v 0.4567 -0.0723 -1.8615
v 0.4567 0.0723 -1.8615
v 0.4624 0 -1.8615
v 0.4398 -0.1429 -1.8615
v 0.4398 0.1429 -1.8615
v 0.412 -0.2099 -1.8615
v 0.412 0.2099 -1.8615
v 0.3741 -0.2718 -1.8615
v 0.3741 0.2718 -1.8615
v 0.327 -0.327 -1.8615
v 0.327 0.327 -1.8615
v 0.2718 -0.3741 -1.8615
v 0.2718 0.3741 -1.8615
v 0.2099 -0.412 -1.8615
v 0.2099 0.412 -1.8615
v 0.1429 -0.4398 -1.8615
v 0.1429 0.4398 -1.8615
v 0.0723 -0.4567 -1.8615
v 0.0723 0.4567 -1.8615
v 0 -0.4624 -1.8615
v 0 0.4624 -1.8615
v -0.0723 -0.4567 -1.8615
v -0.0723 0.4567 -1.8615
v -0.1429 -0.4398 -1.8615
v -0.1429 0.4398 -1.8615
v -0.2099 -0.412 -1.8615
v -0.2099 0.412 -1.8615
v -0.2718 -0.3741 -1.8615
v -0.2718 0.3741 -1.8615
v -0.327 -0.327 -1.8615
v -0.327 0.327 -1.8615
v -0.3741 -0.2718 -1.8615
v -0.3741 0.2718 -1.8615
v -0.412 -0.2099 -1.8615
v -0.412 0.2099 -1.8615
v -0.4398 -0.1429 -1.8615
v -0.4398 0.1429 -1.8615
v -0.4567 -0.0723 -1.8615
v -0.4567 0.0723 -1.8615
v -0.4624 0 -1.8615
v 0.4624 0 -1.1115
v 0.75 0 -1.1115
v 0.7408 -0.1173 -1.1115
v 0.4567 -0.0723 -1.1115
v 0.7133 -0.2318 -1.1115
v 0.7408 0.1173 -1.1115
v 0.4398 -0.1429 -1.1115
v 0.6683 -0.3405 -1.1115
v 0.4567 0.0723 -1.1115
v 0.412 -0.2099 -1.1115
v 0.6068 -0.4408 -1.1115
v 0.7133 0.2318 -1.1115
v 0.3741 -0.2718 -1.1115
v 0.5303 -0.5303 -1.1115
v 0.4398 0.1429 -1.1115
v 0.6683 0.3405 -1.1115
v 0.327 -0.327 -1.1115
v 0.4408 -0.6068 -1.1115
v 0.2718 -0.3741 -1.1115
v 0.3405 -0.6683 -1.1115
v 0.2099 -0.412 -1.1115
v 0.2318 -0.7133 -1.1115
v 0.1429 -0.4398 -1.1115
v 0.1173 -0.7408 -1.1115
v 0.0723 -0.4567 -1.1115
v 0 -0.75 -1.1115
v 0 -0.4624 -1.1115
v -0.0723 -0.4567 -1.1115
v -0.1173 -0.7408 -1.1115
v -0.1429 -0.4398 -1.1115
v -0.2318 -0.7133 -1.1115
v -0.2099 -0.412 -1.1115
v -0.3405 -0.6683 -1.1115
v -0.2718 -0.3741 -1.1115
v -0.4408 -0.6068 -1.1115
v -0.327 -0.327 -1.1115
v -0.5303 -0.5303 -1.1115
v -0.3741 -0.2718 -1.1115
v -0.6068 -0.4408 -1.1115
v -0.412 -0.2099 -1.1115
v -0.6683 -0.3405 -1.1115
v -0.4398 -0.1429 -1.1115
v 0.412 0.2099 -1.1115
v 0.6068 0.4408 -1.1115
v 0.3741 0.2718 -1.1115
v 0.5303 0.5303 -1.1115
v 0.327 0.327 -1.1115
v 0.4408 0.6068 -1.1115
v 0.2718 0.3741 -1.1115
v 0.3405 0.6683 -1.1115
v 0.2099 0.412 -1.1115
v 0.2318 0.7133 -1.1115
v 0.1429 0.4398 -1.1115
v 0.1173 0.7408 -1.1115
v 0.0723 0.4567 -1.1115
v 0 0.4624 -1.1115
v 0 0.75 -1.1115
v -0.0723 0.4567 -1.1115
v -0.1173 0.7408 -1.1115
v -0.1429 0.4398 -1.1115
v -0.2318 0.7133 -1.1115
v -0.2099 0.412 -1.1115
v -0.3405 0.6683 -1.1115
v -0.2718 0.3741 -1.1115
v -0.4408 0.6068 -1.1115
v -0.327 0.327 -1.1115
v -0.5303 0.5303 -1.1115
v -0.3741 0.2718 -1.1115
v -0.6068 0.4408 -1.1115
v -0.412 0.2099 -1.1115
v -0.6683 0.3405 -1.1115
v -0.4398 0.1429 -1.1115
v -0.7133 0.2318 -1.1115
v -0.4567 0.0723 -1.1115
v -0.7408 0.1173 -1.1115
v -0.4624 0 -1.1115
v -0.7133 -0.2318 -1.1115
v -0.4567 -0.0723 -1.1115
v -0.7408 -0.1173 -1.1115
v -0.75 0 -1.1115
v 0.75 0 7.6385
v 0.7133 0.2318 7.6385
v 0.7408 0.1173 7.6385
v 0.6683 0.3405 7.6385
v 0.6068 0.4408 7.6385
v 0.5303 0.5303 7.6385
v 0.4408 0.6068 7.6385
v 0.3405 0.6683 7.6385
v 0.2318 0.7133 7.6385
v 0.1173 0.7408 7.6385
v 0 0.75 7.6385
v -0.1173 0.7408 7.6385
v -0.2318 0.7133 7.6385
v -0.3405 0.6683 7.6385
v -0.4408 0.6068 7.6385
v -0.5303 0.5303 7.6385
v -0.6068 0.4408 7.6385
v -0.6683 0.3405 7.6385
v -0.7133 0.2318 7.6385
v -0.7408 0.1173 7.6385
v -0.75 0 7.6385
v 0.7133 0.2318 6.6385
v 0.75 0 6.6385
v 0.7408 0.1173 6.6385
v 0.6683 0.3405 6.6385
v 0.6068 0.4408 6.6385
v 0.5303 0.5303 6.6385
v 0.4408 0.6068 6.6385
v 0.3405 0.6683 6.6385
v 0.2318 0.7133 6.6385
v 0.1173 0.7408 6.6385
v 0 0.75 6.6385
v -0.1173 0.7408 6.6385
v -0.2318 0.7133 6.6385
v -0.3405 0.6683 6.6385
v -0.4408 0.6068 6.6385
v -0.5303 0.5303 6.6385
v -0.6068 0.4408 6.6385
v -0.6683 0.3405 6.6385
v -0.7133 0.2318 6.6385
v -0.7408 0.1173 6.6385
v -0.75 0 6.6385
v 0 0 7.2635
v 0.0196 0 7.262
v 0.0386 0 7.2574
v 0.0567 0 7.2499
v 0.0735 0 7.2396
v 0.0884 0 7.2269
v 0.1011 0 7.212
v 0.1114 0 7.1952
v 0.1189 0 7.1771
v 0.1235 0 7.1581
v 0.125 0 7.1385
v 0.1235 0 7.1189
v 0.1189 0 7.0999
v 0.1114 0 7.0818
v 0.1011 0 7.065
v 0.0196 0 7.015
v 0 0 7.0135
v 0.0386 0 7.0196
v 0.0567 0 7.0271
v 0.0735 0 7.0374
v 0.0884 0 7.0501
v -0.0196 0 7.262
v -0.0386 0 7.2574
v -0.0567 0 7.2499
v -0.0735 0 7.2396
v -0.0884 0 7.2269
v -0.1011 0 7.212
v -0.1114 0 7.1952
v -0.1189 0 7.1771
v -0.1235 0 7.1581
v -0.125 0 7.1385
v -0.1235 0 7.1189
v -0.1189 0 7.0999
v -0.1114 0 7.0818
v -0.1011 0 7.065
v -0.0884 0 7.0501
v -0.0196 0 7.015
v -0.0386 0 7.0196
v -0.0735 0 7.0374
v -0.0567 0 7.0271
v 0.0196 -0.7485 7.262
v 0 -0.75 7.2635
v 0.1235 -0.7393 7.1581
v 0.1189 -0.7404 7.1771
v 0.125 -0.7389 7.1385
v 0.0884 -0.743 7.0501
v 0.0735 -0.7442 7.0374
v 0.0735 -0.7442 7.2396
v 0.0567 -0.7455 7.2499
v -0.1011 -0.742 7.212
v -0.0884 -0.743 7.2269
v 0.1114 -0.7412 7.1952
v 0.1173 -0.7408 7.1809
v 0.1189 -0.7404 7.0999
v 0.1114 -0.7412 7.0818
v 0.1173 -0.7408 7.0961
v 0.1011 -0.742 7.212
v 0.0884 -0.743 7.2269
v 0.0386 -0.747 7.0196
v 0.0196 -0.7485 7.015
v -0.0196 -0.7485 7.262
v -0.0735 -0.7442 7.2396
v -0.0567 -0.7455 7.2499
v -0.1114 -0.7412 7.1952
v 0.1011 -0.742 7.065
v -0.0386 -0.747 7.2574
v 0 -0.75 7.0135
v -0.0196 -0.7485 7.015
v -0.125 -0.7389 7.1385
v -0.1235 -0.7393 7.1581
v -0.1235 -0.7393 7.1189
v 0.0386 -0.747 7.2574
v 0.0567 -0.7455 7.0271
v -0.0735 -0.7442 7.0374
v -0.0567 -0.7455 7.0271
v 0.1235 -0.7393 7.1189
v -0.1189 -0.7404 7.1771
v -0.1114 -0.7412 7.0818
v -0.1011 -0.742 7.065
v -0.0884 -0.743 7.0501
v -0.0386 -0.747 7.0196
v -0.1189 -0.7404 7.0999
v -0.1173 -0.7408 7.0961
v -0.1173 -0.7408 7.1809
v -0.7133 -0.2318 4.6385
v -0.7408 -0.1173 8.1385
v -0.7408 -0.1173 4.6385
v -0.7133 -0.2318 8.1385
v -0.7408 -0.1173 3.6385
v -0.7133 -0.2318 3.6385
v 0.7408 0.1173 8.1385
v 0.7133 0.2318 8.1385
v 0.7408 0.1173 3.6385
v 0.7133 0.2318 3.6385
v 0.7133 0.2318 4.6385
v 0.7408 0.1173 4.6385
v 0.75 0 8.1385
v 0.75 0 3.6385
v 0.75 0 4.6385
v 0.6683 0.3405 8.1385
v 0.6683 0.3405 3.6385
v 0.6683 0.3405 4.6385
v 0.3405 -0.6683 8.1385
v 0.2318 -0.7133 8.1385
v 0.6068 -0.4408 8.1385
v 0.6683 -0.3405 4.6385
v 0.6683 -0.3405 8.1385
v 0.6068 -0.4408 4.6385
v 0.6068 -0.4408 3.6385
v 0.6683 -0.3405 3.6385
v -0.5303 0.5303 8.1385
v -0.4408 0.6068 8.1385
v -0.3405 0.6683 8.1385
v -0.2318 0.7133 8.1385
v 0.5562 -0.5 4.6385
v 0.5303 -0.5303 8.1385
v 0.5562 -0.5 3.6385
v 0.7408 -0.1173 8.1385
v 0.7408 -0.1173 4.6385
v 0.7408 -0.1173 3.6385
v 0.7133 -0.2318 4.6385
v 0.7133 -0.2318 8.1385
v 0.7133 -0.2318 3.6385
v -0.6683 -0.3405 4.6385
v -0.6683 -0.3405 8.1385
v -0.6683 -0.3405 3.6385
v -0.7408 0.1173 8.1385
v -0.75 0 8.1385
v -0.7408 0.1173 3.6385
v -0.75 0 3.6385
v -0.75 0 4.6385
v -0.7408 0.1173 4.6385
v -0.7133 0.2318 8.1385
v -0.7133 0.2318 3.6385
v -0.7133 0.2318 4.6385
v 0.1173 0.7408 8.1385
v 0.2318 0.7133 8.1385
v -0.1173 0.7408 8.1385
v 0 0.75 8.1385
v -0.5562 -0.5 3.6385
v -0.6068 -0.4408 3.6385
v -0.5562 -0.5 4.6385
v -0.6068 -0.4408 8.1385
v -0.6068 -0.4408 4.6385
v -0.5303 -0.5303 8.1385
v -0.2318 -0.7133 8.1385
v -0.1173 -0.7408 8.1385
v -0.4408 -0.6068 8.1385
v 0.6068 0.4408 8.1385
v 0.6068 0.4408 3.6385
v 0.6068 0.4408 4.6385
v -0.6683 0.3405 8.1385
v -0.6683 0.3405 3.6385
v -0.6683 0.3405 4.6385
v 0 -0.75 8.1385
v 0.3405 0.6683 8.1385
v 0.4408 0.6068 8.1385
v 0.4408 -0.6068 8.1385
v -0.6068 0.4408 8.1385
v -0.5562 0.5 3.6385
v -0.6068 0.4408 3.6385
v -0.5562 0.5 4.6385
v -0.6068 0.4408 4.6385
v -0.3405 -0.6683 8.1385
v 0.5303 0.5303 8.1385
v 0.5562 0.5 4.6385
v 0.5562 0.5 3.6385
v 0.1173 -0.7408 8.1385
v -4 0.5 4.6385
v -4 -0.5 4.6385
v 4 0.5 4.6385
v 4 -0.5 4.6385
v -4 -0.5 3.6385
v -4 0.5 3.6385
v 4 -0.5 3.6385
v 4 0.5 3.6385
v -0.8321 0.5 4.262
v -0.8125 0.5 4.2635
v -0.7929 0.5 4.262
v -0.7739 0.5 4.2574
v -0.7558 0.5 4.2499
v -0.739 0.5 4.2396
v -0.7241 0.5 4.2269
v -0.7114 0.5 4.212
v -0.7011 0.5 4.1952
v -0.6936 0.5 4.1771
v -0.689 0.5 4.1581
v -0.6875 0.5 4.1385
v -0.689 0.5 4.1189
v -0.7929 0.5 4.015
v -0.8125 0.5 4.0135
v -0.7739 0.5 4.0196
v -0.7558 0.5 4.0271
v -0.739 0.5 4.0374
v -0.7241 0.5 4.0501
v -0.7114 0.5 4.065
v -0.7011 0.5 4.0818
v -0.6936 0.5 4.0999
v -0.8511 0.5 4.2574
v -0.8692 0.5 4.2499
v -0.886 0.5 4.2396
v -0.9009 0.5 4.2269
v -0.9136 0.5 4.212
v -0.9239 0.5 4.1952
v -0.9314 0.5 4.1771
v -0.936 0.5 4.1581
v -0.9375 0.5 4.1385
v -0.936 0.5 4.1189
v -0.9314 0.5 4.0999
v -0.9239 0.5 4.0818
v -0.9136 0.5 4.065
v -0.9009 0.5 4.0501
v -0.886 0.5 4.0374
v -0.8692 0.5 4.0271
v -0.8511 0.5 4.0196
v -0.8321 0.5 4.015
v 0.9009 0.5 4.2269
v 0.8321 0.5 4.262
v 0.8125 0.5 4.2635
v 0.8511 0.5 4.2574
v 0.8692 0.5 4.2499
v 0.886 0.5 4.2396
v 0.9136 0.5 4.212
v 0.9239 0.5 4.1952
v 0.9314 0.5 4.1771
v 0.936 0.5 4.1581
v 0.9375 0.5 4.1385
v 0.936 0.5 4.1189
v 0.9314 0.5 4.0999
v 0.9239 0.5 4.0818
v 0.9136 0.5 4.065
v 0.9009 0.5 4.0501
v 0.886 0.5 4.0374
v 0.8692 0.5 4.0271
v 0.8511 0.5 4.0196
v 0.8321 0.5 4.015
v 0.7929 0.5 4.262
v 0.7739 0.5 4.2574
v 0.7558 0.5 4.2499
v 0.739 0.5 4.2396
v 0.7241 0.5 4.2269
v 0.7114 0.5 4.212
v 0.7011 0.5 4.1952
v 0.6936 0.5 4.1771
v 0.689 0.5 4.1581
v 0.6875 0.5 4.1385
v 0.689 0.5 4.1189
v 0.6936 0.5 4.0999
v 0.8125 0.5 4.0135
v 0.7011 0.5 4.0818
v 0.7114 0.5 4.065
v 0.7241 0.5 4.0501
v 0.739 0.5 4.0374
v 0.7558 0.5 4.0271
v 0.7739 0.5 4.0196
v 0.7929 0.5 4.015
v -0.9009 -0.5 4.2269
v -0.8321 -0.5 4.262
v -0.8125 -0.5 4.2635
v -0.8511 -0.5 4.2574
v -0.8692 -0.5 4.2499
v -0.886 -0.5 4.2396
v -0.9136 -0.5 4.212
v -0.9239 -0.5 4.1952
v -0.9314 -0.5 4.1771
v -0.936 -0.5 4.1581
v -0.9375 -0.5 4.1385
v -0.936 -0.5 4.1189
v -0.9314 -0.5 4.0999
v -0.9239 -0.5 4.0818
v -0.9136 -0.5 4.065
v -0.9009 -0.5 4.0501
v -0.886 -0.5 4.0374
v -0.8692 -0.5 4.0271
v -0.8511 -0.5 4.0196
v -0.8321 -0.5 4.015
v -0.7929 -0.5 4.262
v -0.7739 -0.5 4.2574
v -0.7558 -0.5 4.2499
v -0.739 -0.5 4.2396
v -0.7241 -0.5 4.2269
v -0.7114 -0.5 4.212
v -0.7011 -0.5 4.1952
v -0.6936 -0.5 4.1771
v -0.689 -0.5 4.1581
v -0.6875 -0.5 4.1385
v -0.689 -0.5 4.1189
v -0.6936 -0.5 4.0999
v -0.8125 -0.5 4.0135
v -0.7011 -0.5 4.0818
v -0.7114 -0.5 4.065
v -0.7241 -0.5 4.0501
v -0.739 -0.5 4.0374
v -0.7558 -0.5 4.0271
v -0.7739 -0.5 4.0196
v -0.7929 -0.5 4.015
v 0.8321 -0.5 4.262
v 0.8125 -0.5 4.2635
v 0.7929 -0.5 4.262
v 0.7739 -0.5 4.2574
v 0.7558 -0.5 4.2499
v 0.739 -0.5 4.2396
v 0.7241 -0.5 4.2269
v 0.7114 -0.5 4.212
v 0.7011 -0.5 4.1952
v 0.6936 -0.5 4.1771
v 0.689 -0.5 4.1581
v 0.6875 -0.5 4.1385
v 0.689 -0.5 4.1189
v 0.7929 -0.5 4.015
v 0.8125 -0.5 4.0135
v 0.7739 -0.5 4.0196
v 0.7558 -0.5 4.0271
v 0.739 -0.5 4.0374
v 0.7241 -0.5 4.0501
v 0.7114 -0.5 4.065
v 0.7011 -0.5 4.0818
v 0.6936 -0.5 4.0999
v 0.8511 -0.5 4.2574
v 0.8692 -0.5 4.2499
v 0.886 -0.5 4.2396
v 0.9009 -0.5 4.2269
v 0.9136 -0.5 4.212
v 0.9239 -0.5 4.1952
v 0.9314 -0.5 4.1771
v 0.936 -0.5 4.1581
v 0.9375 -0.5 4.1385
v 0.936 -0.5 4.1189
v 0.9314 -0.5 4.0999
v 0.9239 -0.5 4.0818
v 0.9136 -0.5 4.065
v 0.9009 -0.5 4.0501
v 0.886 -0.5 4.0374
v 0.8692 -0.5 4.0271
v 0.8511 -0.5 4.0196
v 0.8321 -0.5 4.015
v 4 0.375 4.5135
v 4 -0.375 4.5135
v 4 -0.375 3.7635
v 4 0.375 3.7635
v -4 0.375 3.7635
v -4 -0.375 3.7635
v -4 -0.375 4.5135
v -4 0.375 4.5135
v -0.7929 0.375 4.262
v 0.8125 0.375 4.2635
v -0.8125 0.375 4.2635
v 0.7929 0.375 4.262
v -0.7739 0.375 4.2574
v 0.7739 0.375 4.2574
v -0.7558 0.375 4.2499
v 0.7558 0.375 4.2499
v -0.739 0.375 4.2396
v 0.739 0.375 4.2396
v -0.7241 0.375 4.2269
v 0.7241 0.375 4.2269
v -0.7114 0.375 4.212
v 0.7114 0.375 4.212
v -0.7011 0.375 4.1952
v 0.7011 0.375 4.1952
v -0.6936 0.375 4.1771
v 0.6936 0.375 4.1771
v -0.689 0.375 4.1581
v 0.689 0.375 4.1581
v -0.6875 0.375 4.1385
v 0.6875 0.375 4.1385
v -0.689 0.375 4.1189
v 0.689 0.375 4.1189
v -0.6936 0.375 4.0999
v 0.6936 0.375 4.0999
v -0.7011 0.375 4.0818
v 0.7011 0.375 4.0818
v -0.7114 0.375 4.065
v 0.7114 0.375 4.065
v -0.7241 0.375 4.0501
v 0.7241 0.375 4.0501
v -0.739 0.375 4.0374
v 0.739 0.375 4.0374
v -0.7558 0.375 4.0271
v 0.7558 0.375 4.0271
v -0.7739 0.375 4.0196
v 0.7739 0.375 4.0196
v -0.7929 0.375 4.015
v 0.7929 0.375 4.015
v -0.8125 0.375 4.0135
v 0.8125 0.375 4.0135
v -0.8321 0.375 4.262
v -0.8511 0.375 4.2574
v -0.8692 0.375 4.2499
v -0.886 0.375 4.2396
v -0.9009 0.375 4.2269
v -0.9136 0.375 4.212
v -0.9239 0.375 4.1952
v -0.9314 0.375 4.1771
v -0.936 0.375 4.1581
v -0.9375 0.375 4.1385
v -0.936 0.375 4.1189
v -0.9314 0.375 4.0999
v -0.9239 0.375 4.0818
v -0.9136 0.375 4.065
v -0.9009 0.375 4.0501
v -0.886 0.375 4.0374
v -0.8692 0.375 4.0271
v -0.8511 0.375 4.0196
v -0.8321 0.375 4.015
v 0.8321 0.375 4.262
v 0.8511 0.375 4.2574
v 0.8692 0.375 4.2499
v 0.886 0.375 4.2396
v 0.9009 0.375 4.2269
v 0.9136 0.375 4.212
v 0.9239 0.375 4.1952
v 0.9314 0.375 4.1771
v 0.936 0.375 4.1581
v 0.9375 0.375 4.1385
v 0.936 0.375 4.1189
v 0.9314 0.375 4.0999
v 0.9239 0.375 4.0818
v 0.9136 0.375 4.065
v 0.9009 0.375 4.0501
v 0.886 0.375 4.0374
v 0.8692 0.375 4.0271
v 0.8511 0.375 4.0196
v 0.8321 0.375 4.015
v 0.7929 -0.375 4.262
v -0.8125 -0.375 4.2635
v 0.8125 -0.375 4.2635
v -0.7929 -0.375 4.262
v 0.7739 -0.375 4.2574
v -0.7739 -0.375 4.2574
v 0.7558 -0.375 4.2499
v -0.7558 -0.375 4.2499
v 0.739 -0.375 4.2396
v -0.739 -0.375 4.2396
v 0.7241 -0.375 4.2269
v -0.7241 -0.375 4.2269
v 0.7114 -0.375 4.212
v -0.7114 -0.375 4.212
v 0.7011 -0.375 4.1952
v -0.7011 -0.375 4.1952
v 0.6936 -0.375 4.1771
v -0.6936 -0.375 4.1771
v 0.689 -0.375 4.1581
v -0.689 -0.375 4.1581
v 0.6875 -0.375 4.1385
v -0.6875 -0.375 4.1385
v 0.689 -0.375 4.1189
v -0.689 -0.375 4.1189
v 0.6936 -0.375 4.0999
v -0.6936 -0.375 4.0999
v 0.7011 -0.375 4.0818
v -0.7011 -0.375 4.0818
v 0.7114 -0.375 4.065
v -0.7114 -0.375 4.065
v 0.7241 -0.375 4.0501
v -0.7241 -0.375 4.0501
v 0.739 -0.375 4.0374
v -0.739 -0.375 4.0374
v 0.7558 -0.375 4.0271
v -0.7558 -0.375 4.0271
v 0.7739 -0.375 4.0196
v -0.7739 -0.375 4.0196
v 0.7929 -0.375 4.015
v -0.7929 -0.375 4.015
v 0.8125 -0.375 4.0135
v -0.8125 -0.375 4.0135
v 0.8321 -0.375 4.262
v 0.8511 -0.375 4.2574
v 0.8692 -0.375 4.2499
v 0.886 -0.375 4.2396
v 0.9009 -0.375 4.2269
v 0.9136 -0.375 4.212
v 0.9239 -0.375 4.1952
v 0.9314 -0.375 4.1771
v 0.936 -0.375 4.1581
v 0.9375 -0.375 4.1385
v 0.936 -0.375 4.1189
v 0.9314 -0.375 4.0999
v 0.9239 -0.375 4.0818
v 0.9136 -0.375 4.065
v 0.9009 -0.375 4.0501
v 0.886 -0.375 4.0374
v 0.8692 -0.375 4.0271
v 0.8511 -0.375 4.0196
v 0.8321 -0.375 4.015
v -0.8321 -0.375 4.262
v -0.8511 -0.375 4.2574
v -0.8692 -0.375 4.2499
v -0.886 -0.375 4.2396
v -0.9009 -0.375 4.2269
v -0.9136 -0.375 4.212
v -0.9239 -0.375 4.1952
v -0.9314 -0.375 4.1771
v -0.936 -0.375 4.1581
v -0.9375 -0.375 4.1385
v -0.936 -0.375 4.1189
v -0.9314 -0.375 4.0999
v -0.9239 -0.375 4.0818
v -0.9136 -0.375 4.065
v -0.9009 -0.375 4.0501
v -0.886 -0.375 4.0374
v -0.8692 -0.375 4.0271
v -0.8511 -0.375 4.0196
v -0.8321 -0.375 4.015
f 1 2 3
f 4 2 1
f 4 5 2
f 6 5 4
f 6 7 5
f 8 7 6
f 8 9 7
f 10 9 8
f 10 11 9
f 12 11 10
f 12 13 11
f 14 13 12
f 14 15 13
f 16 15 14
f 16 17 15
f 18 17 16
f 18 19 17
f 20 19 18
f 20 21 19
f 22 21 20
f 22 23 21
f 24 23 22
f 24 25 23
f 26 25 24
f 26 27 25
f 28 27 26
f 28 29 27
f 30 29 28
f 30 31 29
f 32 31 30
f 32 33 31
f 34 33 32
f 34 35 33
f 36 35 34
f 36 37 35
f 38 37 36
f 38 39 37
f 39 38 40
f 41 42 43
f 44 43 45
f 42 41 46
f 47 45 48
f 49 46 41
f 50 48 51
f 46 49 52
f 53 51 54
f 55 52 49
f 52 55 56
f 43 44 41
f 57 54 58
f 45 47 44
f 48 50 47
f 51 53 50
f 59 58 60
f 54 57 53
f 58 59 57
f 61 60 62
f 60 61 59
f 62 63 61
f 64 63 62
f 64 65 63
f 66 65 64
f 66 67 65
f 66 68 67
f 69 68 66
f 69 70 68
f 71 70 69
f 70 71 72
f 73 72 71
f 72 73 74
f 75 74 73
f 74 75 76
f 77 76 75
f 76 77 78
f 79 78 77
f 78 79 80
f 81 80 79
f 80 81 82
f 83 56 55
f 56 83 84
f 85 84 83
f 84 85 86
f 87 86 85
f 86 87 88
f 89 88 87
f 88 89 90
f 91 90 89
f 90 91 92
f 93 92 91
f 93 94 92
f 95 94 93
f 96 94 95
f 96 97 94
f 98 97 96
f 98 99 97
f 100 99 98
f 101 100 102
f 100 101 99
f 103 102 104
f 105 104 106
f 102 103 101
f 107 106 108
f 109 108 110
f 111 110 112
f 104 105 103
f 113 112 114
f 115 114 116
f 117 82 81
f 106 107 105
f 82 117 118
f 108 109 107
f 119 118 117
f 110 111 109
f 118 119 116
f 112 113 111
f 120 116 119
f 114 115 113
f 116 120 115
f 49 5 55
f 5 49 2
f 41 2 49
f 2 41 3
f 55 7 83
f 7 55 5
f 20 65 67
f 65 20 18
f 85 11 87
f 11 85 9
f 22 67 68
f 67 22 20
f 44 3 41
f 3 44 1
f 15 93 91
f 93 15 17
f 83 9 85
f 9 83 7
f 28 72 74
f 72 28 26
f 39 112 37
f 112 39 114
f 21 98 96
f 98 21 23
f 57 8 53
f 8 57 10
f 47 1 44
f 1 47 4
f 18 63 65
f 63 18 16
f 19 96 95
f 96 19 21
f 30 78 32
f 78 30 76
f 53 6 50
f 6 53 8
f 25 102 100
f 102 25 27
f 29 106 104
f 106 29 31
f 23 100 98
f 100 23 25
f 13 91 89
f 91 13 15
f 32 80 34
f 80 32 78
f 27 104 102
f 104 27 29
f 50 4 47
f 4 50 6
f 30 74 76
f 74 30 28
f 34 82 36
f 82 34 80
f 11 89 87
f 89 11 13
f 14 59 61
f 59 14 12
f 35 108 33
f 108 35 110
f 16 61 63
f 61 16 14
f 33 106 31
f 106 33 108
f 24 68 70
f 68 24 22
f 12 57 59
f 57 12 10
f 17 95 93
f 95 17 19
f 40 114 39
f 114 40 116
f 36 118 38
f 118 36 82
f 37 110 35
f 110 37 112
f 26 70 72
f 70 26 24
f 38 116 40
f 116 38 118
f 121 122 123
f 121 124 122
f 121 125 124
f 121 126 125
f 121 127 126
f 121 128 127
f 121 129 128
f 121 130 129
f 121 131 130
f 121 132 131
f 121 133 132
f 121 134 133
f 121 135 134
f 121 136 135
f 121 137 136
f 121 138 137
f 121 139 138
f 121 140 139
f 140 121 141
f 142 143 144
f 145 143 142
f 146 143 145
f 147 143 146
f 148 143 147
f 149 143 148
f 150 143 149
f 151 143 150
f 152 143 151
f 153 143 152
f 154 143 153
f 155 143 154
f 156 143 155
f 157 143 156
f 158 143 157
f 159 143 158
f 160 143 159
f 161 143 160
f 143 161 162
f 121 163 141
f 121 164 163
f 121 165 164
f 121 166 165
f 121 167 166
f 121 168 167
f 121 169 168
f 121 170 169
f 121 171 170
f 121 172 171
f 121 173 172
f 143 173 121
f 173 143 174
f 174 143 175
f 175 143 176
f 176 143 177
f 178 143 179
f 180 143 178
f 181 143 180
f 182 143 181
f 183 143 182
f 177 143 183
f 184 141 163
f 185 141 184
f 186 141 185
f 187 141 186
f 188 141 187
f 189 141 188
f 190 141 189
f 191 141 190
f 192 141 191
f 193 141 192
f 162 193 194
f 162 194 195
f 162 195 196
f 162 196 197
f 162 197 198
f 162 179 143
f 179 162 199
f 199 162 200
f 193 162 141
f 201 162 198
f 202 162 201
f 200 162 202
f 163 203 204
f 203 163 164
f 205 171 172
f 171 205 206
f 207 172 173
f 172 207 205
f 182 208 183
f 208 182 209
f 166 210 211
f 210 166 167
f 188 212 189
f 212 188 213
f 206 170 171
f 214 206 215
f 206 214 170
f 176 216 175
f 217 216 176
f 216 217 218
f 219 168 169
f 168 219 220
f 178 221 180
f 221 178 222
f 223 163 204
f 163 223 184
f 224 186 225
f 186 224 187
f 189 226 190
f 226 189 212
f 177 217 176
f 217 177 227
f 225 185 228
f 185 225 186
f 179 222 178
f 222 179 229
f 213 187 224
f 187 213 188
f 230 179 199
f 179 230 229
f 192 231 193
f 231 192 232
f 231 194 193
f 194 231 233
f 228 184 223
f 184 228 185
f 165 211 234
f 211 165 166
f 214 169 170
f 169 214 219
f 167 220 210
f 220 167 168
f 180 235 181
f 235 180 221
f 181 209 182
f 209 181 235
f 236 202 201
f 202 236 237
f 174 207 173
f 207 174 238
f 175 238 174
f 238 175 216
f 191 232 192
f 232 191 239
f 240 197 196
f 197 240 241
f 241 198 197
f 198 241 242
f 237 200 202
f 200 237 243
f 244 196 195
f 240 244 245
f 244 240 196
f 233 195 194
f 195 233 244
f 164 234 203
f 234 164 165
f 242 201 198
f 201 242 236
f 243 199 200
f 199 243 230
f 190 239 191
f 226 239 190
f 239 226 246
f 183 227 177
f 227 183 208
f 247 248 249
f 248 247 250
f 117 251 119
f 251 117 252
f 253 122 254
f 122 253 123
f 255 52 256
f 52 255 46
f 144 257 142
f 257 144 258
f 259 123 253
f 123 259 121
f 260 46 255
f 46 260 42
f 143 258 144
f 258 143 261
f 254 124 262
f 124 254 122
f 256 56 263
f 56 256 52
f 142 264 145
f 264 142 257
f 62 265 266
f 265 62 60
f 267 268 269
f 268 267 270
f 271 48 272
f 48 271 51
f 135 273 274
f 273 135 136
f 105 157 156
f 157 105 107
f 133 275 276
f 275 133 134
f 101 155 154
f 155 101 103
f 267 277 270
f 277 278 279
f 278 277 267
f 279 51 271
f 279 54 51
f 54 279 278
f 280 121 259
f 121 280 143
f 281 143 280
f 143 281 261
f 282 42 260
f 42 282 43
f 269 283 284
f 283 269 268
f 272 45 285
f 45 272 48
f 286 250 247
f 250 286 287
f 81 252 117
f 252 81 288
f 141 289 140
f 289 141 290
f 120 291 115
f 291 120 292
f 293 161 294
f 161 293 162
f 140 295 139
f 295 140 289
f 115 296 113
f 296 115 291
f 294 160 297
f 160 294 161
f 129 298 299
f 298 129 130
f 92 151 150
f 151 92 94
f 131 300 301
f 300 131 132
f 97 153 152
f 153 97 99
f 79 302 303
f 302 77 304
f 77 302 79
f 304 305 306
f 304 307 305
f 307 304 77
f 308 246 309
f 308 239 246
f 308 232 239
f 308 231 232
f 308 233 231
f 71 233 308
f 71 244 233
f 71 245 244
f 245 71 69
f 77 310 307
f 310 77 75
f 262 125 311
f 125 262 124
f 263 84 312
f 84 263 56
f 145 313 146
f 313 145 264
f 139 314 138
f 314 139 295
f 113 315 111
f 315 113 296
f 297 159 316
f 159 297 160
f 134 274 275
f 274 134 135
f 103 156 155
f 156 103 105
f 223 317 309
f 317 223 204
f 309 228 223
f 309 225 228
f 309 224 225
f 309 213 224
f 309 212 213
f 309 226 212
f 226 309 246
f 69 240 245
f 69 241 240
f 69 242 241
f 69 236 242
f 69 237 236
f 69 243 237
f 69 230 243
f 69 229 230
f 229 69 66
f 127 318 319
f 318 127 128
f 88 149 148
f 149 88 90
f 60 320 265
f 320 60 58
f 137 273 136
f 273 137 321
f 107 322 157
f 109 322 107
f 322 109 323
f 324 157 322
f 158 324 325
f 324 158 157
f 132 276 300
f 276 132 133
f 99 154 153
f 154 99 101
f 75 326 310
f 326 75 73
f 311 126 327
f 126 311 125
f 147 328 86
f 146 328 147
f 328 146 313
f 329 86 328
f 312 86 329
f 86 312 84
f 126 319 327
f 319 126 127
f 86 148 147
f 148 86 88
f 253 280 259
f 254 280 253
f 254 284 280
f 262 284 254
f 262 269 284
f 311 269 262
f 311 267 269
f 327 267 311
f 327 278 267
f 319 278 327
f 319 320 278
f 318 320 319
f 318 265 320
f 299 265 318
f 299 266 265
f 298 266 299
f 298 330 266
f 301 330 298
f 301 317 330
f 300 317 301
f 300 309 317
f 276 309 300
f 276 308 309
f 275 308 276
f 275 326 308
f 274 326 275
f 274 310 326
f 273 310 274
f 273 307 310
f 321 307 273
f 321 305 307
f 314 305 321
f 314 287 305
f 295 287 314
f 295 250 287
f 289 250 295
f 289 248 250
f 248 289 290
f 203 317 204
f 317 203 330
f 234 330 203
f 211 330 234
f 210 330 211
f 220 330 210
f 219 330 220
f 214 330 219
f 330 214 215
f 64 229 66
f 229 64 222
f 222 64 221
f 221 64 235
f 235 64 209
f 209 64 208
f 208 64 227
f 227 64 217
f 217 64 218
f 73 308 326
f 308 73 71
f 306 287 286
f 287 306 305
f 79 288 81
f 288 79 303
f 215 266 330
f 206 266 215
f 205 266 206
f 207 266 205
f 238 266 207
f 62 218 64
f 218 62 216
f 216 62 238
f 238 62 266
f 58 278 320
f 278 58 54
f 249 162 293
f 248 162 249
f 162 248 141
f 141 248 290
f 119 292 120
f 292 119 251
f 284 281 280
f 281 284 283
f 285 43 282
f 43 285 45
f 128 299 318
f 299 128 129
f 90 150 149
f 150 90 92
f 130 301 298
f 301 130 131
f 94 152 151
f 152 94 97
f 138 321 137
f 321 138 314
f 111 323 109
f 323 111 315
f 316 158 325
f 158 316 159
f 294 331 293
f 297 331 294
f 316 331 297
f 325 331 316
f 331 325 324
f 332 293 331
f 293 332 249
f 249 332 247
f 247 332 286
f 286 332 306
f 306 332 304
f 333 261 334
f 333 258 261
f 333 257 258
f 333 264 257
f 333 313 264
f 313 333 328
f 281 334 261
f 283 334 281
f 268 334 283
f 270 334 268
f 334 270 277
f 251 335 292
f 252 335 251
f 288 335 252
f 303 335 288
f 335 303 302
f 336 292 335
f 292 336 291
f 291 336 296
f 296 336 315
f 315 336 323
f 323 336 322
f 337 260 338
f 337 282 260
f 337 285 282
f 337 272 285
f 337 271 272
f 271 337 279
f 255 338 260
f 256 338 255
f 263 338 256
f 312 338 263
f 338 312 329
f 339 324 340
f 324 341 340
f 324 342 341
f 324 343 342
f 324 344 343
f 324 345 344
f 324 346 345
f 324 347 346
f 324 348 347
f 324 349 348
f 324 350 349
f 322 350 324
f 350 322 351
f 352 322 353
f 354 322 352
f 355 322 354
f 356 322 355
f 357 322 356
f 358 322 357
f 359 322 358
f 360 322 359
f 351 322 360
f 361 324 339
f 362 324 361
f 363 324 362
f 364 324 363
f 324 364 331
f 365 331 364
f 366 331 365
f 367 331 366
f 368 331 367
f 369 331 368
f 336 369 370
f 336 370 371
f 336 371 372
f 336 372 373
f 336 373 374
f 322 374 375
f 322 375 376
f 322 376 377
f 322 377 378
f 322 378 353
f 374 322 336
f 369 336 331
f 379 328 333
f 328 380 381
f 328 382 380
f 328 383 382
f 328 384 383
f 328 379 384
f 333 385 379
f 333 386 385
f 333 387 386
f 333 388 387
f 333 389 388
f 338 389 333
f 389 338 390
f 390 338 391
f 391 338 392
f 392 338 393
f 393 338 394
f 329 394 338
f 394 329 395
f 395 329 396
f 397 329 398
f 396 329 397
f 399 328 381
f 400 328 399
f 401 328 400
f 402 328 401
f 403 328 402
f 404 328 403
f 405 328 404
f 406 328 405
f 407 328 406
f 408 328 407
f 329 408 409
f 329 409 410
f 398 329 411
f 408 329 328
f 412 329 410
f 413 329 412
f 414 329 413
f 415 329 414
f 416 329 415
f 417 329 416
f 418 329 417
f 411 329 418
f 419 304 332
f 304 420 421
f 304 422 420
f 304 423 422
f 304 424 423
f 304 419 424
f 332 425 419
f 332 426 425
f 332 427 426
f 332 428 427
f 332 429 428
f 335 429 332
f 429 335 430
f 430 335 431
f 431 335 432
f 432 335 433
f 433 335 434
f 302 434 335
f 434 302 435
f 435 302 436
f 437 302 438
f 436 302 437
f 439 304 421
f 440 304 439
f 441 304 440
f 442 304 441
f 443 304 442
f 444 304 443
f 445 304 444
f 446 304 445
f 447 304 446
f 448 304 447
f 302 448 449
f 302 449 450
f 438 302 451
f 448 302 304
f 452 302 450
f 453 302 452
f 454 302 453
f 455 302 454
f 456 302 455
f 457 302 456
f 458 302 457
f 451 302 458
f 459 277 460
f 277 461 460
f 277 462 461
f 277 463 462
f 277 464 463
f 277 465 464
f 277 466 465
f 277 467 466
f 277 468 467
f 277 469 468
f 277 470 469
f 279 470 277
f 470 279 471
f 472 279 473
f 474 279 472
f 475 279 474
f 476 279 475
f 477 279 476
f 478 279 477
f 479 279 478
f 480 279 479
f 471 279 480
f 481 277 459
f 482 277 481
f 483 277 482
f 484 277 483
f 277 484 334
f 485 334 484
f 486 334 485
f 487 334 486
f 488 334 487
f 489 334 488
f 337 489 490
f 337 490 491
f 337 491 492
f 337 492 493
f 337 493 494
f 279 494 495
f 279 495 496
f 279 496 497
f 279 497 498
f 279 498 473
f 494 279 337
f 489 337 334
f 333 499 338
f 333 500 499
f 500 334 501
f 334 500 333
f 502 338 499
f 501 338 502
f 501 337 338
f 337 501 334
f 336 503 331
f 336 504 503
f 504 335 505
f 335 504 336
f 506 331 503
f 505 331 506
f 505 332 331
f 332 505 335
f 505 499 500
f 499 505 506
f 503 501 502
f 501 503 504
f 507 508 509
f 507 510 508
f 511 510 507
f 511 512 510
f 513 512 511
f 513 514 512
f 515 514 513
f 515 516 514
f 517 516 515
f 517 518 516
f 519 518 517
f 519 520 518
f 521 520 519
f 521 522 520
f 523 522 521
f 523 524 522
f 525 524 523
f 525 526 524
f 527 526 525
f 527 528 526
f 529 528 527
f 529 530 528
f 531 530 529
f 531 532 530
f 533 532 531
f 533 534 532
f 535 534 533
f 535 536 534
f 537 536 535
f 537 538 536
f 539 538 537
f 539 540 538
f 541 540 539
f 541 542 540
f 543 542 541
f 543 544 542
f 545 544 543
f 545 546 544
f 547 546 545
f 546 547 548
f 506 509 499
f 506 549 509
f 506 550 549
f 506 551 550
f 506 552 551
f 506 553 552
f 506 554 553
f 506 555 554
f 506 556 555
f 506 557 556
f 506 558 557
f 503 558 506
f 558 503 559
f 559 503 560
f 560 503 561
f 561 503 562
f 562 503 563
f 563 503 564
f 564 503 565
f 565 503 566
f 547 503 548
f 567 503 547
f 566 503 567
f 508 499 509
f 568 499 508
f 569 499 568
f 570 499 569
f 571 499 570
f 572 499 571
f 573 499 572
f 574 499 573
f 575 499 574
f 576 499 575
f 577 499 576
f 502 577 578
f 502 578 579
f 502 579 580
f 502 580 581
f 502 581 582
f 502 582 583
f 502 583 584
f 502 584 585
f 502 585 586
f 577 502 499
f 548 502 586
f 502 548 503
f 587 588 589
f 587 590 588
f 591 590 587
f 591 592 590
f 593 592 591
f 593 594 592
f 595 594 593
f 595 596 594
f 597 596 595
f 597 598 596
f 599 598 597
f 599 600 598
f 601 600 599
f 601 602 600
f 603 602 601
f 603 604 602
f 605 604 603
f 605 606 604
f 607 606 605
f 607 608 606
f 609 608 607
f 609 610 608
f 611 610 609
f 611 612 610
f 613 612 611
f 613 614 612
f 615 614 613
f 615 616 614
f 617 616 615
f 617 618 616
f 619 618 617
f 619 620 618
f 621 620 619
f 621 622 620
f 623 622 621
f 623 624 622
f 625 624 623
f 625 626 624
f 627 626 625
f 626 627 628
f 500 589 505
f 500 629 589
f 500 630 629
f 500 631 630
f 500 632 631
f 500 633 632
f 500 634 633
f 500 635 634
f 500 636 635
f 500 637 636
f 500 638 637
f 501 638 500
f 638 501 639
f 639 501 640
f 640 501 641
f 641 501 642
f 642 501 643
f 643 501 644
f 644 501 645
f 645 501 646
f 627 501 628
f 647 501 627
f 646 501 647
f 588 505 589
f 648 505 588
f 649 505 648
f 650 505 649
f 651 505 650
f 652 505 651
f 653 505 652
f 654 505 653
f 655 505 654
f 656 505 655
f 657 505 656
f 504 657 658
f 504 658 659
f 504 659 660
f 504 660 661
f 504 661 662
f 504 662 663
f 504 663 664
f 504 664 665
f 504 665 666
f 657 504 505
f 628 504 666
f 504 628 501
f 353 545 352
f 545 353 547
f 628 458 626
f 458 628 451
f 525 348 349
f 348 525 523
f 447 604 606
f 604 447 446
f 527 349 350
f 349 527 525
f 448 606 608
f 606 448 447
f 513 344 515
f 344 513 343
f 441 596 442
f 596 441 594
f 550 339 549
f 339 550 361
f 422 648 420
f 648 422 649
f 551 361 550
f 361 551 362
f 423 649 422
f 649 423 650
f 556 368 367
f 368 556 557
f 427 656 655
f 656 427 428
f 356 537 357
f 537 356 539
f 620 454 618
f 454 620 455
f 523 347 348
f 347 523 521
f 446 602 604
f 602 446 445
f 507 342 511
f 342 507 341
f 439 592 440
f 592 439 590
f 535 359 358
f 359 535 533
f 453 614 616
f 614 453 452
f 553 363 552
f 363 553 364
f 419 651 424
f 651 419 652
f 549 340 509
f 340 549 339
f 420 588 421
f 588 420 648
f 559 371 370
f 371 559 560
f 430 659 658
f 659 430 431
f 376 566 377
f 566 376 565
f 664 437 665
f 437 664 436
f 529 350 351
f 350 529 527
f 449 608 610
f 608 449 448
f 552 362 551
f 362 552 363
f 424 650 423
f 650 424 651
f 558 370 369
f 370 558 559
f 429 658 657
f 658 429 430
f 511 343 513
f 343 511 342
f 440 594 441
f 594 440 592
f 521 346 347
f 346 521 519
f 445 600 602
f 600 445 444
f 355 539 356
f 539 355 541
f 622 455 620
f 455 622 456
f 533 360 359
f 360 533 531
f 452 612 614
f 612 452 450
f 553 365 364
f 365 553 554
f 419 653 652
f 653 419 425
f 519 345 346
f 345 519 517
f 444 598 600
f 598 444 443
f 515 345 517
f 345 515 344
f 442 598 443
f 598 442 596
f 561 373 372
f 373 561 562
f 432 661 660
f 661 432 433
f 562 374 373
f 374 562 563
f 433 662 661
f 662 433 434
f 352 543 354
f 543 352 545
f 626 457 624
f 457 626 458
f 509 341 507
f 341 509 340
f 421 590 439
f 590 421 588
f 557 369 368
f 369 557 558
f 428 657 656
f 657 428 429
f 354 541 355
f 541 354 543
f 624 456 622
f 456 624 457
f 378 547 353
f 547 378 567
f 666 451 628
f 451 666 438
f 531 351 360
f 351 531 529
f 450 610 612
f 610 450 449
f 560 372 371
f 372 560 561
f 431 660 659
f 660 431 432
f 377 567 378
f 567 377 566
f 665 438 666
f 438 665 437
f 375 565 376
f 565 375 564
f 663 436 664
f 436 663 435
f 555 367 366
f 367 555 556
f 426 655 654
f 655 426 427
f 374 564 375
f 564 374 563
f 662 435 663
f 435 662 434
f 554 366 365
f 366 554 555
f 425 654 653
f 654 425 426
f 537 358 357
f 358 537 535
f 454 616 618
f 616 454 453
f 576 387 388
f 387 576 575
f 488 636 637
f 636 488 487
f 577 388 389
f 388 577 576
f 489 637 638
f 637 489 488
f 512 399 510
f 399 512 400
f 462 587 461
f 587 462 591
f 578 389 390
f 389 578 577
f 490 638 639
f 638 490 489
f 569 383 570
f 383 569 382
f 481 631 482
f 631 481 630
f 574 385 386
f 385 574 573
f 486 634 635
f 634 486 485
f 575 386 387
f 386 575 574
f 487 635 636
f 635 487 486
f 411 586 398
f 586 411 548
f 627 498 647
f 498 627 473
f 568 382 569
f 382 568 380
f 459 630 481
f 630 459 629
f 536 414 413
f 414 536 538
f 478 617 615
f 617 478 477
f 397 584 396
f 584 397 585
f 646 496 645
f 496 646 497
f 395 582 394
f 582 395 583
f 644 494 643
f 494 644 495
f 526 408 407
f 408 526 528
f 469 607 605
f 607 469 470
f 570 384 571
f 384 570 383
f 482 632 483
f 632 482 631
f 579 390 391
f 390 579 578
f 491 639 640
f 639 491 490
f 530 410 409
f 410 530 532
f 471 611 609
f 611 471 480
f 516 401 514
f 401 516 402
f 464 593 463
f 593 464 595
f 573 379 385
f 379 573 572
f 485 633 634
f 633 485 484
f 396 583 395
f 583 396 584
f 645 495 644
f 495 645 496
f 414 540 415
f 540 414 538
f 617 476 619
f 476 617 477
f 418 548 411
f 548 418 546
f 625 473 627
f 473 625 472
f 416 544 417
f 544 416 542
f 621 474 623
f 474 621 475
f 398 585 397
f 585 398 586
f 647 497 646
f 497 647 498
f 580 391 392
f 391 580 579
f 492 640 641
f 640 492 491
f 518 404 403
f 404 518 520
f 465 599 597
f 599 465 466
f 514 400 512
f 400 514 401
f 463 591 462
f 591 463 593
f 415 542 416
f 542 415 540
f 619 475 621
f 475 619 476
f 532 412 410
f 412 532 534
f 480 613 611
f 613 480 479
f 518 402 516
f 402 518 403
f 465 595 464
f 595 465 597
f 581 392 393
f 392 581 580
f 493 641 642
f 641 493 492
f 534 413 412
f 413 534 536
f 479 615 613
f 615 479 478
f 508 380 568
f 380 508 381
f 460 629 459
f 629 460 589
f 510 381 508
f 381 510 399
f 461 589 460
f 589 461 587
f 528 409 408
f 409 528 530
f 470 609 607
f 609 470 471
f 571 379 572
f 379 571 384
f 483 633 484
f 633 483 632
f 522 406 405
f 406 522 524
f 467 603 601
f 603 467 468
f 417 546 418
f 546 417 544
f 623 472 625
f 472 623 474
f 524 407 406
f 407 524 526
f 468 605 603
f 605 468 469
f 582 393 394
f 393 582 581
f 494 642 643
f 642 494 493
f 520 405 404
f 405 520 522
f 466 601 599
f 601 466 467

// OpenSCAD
// file: mast.scad
/*
 * Antenna Rotator 16 kg-m
 * Copyright 2012 John Pritchard
 *
 * This program is free software: you can redistribute it and/or modify
 * it under the terms of the GNU General Public License as published by
 * the Free Software Foundation, either version 3 of the License, or
 * (at your option) any later version.
 *
 * This program is distributed in the hope that it will be useful,
 * but WITHOUT ANY WARRANTY; without even the implied warranty of
 * MERCHANTABILITY or FITNESS FOR A PARTICULAR PURPOSE.  See the
 * GNU General Public License for more details.
 *
 * You should have received a copy of the GNU General Public License
 * along with this program.  If not, see <http://www.gnu.org/licenses/>.
 */

/*
 * units = inches
 */


mast_bearing_height = 0.42;

/*
 * LM67048 Tapered Bearing and L44610 Cup: 1.25 ID, 1.98 OD
 */
module mast_bearing(){
	difference(){
		cylinder(r = 0.990, h = mast_bearing_height, center = true, $fn = resolution);
		cylinder(r = 0.625, h = mast_bearing_height, center = true, $fn = resolution);
	}
}

mast_block_height = 0.75;

/*
 * Turn 2" Round 6061 to (2.0-mechtol) OD
 */
module mast_block(){
	/*
	 * TODO 
	 */
	cylinder(r = (2.0-mechtol)/2, h = mast_block_height, center = true, $fn = resolution);
}
// file: gearmotor.scad
/*
 * Antenna Rotator 16 kg-m
 * Copyright 2012 John Pritchard
 *
 * This program is free software: you can redistribute it and/or modify
 * it under the terms of the GNU General Public License as published by
 * the Free Software Foundation, either version 3 of the License, or
 * (at your option) any later version.
 *
 * This program is distributed in the hope that it will be useful,
 * but WITHOUT ANY WARRANTY; without even the implied warranty of
 * MERCHANTABILITY or FITNESS FOR A PARTICULAR PURPOSE.  See the
 * GNU General Public License for more details.
 *
 * You should have received a copy of the GNU General Public License
 * along with this program.  If not, see <http://www.gnu.org/licenses/>.
 */

/*
 * units = inches
 * 
 * External constants
 * 
 * resolution: 10 is low, 100 is high
 *
 * mechtol: mechanical tolerance
 */

gearmotor_body_radius = 0.8366;
gearmotor_body_height = 3.819;

gearmotor_mount_shoulder_radius = 0.4724;
gearmotor_mount_shoulder_height = 0.106;

/*
 * Brushless motor with planetary gearhead, 
 * drive control, position encoder, brake:
 * 24V, 2A, 500:1, 15.6 kg-m, 8 rpm;
 * http://www.aliexpress.com/store/product/explosion-proof-DC-servo-Brushless-gear-motor-micro-planetary-gearbox-gear-reducer-156kg-cm-hight-torque/506137_516569606.html
 */
module gearmotor(){
	difference(){
		union(){

			gearmotor_body();
			/*
			 * Mount plane from center
			 */
			translate([0,0,1.9095]){

				gearmotor_mount_shoulder(gearmotor_mount_shoulder_height,(gearmotor_mount_shoulder_height/2));

				gearmotor_output_shaft();
			}
			/*
			 * Electrical connector, a space filling model
			 * for the bounds [20,2.75,6] mm
			 */
			translate([0,-gearmotor_body_radius,-1.339]){
				cube(size = [0.7874,0.2166,0.2362], center = true);
			}
		}
		fastener_m4_mount_tapped(0.5,1.9095);
	}
}
/*
 * Main body volume
 */
module gearmotor_body(radius = gearmotor_body_radius, height = gearmotor_body_height){
	cylinder( r = radius, h = height, center = true, $fn = resolution);
}
/*
 * Output shaft
 * Translated for half of height, centered
 */
module gearmotor_output_shaft(length = 0.787){

	translate([0,0,(length/2)]){
		cylinder(r = 0.2362, length, center = true, $fn = resolution);
	}
}
/*
 * Mount shoulder
 * Translated for half of height, centered
 */
module gearmotor_mount_shoulder(height = gearmotor_mount_shoulder_height, offset = 0){

	translate([0,0,offset]){
		cylinder(r = gearmotor_mount_shoulder_radius, height, center = true, $fn = resolution);
	}
}
/*
 * Motor mounting in the mount plane: shoulder and tap holes
 */
module gearmotor_mount(depth,offset = 0){
	gearmotor_mount_shoulder(depth,offset);
	fastener_m4_mount_tapped(depth,offset);
}
// file: fasteners.scad
/*
 * Antenna Rotator 16 kg-m
 * Copyright 2012 John Pritchard
 *
 * This program is free software: you can redistribute it and/or modify
 * it under the terms of the GNU General Public License as published by
 * the Free Software Foundation, either version 3 of the License, or
 * (at your option) any later version.
 *
 * This program is distributed in the hope that it will be useful,
 * but WITHOUT ANY WARRANTY; without even the implied warranty of
 * MERCHANTABILITY or FITNESS FOR A PARTICULAR PURPOSE.  See the
 * GNU General Public License for more details.
 *
 * You should have received a copy of the GNU General Public License
 * along with this program.  If not, see <http://www.gnu.org/licenses/>.
 */

/*
 * units = inches
 */

/*
 * M4 Hole represented as the thread depth OD
 */
module fastener_m4_tapped(depth = 0.5, expansion = 0){

	cylinder(r = 0.0787+expansion, depth, center = true, $fn = resolution);
}
/*
 * 4 x M4 Holes in motor mount
 * 
 * M4 ALLEN DIN 912 Head + Flat Washer (4 + 0.8 mm): depth = 0.189, expansion = 0.1771
 * 
 * M4 ALLEN DIN 912
 * Head Height 4 mm, 0.1575 in; Diameter 7 mm, 0.2756 in
 *
 * Flat Washer
 * Diameter 9mm, 0.3543 in; Height = 0.8 mm, 0.0315 in: depth = 0.25, expansion = 0.1771
 */
module fastener_m4_mount_tapped(depth = 0.5, offset = 0, expansion = 0){

	for (theta = [0 : 90: 300] ){
		/*
		 * translate to the mount plane and hole center
		 * for a representative space.
		 */
		translate([0.6693*sin(theta),0.6693*cos(theta),offset]){

			fastener_m4_tapped(depth,expansion);
		}
	}
}
/*
 * M4 Tap Hole ID 3.2 mm; 0.126 in; IR = 0.063 in
 */
module fastener_m4_tap(depth){

	cylinder(r = 0.063, h = depth, center = true, $fn = resolution);
	/*
	 * Cube test of minimal wall dimension
	 * 
	 * If this passes with no intersections, then the volume is safe.  
	 * A reasonable depth (min 8 mm) is always much greater than the 
	 * radius (nom 3.2 mm), providing some initial information about
	 * the interior wall dimensions.
	 * 
	 * The ideal version of this would be a torus centered on the 
	 * interior edge of the cylinder, with the plane of the extent of
	 * the depth of the torus, and the cylinder of the extent of the 
	 * radius of the torus.
	 * 
	cube(size = depth, center = true, $fn = 40);
	 */
}
/*
 * 4 x M4 Tap Holes with Depth on Round OD
 */
module fastener_m4_round_taps(od, depth){

	assign(radius = (od/2)-(depth/2)){

		for (rot = [45: 90: 360]){
	
			translate([(radius*sin(rot)),(radius*cos(rot)),0]){

				rotate([0,90,rot]){

					fastener_m4_tap(depth);
				}
			}
		}
	}
}

/*
 * M4 Counter Sunk Head
 * 
 * Centered in wall with indent.
 * 
 * Indent is not a mechanical figure, but is employed for
 * positive curve intersections in tube walls.  Mechanically
 * the top of the countersink triangle is on the lowest sides
 * (the saddle) of the intersection of the walled tube and
 * the "triangular" countersink cylinder.
 */
module fastener_m4_countersink(wall = 0.1875, indent = 0.1, debug = false){

	del = (wall-0.0976);
    ctr = (del/2);

	union(){
		translate([0,0,+((indent/2)+(0.0976/2)+ctr)]){

			cylinder( r = (0.3508/2), h = indent, center = true, $fn = resolution);
		}
		translate([0,0,ctr]){
			cylinder( r1 = (0.1575/2), r2 = (0.3508/2), h = 0.0976, center = true, $fn = resolution);
		}
		translate([0,0,(ctr-(0.0976/2)-(del/2))]){

			cylinder( r = (0.1575/2), h = (del+indent), center = true, $fn = resolution);
		}
	}
	if (debug){
		translate([-(wall),0,-(wall/2)]){

			cube( size = [(2*wall),(2*wall),wall], center = false);
		}
	}
}
/*
 * 4 x M4 Counter Sunk Heads on Tube OD
 */
module fastener_m4_tube_countersinks(od = 3.0, wall = 0.1875){

	assign(radius = ((od/2)-0.09375)){

		_fastener_m4_tube_countersinks_F_(wall,radius,45);
		_fastener_m4_tube_countersinks_R_(wall,radius,135);
		_fastener_m4_tube_countersinks_F_(wall,radius,225);
		_fastener_m4_tube_countersinks_R_(wall,radius,315);
	}
}
module _fastener_m4_tube_countersinks_F_(wall, radius, rot){
	translate([(radius*sin(rot)),(radius*cos(rot)),0]){
		rotate([0,90,rot]){
			fastener_m4_countersink(wall);
		}
	}
}
module _fastener_m4_tube_countersinks_R_(wall, radius, rot){
	translate([(radius*sin(rot)),(radius*cos(rot)),0]){
		rotate([0,-90,rot]){
			fastener_m4_countersink(wall);
		}
	}
}
// file: constants.scad
/*
 * Antenna Rotator 16 kg-m
 * Copyright 2012 John Pritchard
 *
 * This program is free software: you can redistribute it and/or modify
 * it under the terms of the GNU General Public License as published by
 * the Free Software Foundation, either version 3 of the License, or
 * (at your option) any later version.
 *
 * This program is distributed in the hope that it will be useful,
 * but WITHOUT ANY WARRANTY; without even the implied warranty of
 * MERCHANTABILITY or FITNESS FOR A PARTICULAR PURPOSE.  See the
 * GNU General Public License for more details.
 *
 * You should have received a copy of the GNU General Public License
 * along with this program.  If not, see <http://www.gnu.org/licenses/>.
 */

/*
 * units = inches
 */

/*
 * model resolution: 10 is low, 100 is high
 */
resolution = 40;
/*
 * mechanical tolerance, separation of fit:
 * applied to diameter of cylinder, side of cube
 */
mechtol = 0.005;
// main file
/*
 * Antenna Rotator 16 kg-m
 * Copyright 2012 John Pritchard
 *
 * This program is free software: you can redistribute it and/or modify
 * it under the terms of the GNU General Public License as published by
 * the Free Software Foundation, either version 3 of the License, or
 * (at your option) any later version.
 *
 * This program is distributed in the hope that it will be useful,
 * but WITHOUT ANY WARRANTY; without even the implied warranty of
 * MERCHANTABILITY or FITNESS FOR A PARTICULAR PURPOSE.  See the
 * GNU General Public License for more details.
 *
 * You should have received a copy of the GNU General Public License
 * along with this program.  If not, see <http://www.gnu.org/licenses/>.
 */


/*
 * employ "include", not "use", so the resolution and 
 * tolerance constants are shared
 */
include <constants.scad>;
include <fasteners.scad>;
include <gearmotor.scad>;
include <head.scad>;
include <mast.scad>;


head_vertical_axle();
